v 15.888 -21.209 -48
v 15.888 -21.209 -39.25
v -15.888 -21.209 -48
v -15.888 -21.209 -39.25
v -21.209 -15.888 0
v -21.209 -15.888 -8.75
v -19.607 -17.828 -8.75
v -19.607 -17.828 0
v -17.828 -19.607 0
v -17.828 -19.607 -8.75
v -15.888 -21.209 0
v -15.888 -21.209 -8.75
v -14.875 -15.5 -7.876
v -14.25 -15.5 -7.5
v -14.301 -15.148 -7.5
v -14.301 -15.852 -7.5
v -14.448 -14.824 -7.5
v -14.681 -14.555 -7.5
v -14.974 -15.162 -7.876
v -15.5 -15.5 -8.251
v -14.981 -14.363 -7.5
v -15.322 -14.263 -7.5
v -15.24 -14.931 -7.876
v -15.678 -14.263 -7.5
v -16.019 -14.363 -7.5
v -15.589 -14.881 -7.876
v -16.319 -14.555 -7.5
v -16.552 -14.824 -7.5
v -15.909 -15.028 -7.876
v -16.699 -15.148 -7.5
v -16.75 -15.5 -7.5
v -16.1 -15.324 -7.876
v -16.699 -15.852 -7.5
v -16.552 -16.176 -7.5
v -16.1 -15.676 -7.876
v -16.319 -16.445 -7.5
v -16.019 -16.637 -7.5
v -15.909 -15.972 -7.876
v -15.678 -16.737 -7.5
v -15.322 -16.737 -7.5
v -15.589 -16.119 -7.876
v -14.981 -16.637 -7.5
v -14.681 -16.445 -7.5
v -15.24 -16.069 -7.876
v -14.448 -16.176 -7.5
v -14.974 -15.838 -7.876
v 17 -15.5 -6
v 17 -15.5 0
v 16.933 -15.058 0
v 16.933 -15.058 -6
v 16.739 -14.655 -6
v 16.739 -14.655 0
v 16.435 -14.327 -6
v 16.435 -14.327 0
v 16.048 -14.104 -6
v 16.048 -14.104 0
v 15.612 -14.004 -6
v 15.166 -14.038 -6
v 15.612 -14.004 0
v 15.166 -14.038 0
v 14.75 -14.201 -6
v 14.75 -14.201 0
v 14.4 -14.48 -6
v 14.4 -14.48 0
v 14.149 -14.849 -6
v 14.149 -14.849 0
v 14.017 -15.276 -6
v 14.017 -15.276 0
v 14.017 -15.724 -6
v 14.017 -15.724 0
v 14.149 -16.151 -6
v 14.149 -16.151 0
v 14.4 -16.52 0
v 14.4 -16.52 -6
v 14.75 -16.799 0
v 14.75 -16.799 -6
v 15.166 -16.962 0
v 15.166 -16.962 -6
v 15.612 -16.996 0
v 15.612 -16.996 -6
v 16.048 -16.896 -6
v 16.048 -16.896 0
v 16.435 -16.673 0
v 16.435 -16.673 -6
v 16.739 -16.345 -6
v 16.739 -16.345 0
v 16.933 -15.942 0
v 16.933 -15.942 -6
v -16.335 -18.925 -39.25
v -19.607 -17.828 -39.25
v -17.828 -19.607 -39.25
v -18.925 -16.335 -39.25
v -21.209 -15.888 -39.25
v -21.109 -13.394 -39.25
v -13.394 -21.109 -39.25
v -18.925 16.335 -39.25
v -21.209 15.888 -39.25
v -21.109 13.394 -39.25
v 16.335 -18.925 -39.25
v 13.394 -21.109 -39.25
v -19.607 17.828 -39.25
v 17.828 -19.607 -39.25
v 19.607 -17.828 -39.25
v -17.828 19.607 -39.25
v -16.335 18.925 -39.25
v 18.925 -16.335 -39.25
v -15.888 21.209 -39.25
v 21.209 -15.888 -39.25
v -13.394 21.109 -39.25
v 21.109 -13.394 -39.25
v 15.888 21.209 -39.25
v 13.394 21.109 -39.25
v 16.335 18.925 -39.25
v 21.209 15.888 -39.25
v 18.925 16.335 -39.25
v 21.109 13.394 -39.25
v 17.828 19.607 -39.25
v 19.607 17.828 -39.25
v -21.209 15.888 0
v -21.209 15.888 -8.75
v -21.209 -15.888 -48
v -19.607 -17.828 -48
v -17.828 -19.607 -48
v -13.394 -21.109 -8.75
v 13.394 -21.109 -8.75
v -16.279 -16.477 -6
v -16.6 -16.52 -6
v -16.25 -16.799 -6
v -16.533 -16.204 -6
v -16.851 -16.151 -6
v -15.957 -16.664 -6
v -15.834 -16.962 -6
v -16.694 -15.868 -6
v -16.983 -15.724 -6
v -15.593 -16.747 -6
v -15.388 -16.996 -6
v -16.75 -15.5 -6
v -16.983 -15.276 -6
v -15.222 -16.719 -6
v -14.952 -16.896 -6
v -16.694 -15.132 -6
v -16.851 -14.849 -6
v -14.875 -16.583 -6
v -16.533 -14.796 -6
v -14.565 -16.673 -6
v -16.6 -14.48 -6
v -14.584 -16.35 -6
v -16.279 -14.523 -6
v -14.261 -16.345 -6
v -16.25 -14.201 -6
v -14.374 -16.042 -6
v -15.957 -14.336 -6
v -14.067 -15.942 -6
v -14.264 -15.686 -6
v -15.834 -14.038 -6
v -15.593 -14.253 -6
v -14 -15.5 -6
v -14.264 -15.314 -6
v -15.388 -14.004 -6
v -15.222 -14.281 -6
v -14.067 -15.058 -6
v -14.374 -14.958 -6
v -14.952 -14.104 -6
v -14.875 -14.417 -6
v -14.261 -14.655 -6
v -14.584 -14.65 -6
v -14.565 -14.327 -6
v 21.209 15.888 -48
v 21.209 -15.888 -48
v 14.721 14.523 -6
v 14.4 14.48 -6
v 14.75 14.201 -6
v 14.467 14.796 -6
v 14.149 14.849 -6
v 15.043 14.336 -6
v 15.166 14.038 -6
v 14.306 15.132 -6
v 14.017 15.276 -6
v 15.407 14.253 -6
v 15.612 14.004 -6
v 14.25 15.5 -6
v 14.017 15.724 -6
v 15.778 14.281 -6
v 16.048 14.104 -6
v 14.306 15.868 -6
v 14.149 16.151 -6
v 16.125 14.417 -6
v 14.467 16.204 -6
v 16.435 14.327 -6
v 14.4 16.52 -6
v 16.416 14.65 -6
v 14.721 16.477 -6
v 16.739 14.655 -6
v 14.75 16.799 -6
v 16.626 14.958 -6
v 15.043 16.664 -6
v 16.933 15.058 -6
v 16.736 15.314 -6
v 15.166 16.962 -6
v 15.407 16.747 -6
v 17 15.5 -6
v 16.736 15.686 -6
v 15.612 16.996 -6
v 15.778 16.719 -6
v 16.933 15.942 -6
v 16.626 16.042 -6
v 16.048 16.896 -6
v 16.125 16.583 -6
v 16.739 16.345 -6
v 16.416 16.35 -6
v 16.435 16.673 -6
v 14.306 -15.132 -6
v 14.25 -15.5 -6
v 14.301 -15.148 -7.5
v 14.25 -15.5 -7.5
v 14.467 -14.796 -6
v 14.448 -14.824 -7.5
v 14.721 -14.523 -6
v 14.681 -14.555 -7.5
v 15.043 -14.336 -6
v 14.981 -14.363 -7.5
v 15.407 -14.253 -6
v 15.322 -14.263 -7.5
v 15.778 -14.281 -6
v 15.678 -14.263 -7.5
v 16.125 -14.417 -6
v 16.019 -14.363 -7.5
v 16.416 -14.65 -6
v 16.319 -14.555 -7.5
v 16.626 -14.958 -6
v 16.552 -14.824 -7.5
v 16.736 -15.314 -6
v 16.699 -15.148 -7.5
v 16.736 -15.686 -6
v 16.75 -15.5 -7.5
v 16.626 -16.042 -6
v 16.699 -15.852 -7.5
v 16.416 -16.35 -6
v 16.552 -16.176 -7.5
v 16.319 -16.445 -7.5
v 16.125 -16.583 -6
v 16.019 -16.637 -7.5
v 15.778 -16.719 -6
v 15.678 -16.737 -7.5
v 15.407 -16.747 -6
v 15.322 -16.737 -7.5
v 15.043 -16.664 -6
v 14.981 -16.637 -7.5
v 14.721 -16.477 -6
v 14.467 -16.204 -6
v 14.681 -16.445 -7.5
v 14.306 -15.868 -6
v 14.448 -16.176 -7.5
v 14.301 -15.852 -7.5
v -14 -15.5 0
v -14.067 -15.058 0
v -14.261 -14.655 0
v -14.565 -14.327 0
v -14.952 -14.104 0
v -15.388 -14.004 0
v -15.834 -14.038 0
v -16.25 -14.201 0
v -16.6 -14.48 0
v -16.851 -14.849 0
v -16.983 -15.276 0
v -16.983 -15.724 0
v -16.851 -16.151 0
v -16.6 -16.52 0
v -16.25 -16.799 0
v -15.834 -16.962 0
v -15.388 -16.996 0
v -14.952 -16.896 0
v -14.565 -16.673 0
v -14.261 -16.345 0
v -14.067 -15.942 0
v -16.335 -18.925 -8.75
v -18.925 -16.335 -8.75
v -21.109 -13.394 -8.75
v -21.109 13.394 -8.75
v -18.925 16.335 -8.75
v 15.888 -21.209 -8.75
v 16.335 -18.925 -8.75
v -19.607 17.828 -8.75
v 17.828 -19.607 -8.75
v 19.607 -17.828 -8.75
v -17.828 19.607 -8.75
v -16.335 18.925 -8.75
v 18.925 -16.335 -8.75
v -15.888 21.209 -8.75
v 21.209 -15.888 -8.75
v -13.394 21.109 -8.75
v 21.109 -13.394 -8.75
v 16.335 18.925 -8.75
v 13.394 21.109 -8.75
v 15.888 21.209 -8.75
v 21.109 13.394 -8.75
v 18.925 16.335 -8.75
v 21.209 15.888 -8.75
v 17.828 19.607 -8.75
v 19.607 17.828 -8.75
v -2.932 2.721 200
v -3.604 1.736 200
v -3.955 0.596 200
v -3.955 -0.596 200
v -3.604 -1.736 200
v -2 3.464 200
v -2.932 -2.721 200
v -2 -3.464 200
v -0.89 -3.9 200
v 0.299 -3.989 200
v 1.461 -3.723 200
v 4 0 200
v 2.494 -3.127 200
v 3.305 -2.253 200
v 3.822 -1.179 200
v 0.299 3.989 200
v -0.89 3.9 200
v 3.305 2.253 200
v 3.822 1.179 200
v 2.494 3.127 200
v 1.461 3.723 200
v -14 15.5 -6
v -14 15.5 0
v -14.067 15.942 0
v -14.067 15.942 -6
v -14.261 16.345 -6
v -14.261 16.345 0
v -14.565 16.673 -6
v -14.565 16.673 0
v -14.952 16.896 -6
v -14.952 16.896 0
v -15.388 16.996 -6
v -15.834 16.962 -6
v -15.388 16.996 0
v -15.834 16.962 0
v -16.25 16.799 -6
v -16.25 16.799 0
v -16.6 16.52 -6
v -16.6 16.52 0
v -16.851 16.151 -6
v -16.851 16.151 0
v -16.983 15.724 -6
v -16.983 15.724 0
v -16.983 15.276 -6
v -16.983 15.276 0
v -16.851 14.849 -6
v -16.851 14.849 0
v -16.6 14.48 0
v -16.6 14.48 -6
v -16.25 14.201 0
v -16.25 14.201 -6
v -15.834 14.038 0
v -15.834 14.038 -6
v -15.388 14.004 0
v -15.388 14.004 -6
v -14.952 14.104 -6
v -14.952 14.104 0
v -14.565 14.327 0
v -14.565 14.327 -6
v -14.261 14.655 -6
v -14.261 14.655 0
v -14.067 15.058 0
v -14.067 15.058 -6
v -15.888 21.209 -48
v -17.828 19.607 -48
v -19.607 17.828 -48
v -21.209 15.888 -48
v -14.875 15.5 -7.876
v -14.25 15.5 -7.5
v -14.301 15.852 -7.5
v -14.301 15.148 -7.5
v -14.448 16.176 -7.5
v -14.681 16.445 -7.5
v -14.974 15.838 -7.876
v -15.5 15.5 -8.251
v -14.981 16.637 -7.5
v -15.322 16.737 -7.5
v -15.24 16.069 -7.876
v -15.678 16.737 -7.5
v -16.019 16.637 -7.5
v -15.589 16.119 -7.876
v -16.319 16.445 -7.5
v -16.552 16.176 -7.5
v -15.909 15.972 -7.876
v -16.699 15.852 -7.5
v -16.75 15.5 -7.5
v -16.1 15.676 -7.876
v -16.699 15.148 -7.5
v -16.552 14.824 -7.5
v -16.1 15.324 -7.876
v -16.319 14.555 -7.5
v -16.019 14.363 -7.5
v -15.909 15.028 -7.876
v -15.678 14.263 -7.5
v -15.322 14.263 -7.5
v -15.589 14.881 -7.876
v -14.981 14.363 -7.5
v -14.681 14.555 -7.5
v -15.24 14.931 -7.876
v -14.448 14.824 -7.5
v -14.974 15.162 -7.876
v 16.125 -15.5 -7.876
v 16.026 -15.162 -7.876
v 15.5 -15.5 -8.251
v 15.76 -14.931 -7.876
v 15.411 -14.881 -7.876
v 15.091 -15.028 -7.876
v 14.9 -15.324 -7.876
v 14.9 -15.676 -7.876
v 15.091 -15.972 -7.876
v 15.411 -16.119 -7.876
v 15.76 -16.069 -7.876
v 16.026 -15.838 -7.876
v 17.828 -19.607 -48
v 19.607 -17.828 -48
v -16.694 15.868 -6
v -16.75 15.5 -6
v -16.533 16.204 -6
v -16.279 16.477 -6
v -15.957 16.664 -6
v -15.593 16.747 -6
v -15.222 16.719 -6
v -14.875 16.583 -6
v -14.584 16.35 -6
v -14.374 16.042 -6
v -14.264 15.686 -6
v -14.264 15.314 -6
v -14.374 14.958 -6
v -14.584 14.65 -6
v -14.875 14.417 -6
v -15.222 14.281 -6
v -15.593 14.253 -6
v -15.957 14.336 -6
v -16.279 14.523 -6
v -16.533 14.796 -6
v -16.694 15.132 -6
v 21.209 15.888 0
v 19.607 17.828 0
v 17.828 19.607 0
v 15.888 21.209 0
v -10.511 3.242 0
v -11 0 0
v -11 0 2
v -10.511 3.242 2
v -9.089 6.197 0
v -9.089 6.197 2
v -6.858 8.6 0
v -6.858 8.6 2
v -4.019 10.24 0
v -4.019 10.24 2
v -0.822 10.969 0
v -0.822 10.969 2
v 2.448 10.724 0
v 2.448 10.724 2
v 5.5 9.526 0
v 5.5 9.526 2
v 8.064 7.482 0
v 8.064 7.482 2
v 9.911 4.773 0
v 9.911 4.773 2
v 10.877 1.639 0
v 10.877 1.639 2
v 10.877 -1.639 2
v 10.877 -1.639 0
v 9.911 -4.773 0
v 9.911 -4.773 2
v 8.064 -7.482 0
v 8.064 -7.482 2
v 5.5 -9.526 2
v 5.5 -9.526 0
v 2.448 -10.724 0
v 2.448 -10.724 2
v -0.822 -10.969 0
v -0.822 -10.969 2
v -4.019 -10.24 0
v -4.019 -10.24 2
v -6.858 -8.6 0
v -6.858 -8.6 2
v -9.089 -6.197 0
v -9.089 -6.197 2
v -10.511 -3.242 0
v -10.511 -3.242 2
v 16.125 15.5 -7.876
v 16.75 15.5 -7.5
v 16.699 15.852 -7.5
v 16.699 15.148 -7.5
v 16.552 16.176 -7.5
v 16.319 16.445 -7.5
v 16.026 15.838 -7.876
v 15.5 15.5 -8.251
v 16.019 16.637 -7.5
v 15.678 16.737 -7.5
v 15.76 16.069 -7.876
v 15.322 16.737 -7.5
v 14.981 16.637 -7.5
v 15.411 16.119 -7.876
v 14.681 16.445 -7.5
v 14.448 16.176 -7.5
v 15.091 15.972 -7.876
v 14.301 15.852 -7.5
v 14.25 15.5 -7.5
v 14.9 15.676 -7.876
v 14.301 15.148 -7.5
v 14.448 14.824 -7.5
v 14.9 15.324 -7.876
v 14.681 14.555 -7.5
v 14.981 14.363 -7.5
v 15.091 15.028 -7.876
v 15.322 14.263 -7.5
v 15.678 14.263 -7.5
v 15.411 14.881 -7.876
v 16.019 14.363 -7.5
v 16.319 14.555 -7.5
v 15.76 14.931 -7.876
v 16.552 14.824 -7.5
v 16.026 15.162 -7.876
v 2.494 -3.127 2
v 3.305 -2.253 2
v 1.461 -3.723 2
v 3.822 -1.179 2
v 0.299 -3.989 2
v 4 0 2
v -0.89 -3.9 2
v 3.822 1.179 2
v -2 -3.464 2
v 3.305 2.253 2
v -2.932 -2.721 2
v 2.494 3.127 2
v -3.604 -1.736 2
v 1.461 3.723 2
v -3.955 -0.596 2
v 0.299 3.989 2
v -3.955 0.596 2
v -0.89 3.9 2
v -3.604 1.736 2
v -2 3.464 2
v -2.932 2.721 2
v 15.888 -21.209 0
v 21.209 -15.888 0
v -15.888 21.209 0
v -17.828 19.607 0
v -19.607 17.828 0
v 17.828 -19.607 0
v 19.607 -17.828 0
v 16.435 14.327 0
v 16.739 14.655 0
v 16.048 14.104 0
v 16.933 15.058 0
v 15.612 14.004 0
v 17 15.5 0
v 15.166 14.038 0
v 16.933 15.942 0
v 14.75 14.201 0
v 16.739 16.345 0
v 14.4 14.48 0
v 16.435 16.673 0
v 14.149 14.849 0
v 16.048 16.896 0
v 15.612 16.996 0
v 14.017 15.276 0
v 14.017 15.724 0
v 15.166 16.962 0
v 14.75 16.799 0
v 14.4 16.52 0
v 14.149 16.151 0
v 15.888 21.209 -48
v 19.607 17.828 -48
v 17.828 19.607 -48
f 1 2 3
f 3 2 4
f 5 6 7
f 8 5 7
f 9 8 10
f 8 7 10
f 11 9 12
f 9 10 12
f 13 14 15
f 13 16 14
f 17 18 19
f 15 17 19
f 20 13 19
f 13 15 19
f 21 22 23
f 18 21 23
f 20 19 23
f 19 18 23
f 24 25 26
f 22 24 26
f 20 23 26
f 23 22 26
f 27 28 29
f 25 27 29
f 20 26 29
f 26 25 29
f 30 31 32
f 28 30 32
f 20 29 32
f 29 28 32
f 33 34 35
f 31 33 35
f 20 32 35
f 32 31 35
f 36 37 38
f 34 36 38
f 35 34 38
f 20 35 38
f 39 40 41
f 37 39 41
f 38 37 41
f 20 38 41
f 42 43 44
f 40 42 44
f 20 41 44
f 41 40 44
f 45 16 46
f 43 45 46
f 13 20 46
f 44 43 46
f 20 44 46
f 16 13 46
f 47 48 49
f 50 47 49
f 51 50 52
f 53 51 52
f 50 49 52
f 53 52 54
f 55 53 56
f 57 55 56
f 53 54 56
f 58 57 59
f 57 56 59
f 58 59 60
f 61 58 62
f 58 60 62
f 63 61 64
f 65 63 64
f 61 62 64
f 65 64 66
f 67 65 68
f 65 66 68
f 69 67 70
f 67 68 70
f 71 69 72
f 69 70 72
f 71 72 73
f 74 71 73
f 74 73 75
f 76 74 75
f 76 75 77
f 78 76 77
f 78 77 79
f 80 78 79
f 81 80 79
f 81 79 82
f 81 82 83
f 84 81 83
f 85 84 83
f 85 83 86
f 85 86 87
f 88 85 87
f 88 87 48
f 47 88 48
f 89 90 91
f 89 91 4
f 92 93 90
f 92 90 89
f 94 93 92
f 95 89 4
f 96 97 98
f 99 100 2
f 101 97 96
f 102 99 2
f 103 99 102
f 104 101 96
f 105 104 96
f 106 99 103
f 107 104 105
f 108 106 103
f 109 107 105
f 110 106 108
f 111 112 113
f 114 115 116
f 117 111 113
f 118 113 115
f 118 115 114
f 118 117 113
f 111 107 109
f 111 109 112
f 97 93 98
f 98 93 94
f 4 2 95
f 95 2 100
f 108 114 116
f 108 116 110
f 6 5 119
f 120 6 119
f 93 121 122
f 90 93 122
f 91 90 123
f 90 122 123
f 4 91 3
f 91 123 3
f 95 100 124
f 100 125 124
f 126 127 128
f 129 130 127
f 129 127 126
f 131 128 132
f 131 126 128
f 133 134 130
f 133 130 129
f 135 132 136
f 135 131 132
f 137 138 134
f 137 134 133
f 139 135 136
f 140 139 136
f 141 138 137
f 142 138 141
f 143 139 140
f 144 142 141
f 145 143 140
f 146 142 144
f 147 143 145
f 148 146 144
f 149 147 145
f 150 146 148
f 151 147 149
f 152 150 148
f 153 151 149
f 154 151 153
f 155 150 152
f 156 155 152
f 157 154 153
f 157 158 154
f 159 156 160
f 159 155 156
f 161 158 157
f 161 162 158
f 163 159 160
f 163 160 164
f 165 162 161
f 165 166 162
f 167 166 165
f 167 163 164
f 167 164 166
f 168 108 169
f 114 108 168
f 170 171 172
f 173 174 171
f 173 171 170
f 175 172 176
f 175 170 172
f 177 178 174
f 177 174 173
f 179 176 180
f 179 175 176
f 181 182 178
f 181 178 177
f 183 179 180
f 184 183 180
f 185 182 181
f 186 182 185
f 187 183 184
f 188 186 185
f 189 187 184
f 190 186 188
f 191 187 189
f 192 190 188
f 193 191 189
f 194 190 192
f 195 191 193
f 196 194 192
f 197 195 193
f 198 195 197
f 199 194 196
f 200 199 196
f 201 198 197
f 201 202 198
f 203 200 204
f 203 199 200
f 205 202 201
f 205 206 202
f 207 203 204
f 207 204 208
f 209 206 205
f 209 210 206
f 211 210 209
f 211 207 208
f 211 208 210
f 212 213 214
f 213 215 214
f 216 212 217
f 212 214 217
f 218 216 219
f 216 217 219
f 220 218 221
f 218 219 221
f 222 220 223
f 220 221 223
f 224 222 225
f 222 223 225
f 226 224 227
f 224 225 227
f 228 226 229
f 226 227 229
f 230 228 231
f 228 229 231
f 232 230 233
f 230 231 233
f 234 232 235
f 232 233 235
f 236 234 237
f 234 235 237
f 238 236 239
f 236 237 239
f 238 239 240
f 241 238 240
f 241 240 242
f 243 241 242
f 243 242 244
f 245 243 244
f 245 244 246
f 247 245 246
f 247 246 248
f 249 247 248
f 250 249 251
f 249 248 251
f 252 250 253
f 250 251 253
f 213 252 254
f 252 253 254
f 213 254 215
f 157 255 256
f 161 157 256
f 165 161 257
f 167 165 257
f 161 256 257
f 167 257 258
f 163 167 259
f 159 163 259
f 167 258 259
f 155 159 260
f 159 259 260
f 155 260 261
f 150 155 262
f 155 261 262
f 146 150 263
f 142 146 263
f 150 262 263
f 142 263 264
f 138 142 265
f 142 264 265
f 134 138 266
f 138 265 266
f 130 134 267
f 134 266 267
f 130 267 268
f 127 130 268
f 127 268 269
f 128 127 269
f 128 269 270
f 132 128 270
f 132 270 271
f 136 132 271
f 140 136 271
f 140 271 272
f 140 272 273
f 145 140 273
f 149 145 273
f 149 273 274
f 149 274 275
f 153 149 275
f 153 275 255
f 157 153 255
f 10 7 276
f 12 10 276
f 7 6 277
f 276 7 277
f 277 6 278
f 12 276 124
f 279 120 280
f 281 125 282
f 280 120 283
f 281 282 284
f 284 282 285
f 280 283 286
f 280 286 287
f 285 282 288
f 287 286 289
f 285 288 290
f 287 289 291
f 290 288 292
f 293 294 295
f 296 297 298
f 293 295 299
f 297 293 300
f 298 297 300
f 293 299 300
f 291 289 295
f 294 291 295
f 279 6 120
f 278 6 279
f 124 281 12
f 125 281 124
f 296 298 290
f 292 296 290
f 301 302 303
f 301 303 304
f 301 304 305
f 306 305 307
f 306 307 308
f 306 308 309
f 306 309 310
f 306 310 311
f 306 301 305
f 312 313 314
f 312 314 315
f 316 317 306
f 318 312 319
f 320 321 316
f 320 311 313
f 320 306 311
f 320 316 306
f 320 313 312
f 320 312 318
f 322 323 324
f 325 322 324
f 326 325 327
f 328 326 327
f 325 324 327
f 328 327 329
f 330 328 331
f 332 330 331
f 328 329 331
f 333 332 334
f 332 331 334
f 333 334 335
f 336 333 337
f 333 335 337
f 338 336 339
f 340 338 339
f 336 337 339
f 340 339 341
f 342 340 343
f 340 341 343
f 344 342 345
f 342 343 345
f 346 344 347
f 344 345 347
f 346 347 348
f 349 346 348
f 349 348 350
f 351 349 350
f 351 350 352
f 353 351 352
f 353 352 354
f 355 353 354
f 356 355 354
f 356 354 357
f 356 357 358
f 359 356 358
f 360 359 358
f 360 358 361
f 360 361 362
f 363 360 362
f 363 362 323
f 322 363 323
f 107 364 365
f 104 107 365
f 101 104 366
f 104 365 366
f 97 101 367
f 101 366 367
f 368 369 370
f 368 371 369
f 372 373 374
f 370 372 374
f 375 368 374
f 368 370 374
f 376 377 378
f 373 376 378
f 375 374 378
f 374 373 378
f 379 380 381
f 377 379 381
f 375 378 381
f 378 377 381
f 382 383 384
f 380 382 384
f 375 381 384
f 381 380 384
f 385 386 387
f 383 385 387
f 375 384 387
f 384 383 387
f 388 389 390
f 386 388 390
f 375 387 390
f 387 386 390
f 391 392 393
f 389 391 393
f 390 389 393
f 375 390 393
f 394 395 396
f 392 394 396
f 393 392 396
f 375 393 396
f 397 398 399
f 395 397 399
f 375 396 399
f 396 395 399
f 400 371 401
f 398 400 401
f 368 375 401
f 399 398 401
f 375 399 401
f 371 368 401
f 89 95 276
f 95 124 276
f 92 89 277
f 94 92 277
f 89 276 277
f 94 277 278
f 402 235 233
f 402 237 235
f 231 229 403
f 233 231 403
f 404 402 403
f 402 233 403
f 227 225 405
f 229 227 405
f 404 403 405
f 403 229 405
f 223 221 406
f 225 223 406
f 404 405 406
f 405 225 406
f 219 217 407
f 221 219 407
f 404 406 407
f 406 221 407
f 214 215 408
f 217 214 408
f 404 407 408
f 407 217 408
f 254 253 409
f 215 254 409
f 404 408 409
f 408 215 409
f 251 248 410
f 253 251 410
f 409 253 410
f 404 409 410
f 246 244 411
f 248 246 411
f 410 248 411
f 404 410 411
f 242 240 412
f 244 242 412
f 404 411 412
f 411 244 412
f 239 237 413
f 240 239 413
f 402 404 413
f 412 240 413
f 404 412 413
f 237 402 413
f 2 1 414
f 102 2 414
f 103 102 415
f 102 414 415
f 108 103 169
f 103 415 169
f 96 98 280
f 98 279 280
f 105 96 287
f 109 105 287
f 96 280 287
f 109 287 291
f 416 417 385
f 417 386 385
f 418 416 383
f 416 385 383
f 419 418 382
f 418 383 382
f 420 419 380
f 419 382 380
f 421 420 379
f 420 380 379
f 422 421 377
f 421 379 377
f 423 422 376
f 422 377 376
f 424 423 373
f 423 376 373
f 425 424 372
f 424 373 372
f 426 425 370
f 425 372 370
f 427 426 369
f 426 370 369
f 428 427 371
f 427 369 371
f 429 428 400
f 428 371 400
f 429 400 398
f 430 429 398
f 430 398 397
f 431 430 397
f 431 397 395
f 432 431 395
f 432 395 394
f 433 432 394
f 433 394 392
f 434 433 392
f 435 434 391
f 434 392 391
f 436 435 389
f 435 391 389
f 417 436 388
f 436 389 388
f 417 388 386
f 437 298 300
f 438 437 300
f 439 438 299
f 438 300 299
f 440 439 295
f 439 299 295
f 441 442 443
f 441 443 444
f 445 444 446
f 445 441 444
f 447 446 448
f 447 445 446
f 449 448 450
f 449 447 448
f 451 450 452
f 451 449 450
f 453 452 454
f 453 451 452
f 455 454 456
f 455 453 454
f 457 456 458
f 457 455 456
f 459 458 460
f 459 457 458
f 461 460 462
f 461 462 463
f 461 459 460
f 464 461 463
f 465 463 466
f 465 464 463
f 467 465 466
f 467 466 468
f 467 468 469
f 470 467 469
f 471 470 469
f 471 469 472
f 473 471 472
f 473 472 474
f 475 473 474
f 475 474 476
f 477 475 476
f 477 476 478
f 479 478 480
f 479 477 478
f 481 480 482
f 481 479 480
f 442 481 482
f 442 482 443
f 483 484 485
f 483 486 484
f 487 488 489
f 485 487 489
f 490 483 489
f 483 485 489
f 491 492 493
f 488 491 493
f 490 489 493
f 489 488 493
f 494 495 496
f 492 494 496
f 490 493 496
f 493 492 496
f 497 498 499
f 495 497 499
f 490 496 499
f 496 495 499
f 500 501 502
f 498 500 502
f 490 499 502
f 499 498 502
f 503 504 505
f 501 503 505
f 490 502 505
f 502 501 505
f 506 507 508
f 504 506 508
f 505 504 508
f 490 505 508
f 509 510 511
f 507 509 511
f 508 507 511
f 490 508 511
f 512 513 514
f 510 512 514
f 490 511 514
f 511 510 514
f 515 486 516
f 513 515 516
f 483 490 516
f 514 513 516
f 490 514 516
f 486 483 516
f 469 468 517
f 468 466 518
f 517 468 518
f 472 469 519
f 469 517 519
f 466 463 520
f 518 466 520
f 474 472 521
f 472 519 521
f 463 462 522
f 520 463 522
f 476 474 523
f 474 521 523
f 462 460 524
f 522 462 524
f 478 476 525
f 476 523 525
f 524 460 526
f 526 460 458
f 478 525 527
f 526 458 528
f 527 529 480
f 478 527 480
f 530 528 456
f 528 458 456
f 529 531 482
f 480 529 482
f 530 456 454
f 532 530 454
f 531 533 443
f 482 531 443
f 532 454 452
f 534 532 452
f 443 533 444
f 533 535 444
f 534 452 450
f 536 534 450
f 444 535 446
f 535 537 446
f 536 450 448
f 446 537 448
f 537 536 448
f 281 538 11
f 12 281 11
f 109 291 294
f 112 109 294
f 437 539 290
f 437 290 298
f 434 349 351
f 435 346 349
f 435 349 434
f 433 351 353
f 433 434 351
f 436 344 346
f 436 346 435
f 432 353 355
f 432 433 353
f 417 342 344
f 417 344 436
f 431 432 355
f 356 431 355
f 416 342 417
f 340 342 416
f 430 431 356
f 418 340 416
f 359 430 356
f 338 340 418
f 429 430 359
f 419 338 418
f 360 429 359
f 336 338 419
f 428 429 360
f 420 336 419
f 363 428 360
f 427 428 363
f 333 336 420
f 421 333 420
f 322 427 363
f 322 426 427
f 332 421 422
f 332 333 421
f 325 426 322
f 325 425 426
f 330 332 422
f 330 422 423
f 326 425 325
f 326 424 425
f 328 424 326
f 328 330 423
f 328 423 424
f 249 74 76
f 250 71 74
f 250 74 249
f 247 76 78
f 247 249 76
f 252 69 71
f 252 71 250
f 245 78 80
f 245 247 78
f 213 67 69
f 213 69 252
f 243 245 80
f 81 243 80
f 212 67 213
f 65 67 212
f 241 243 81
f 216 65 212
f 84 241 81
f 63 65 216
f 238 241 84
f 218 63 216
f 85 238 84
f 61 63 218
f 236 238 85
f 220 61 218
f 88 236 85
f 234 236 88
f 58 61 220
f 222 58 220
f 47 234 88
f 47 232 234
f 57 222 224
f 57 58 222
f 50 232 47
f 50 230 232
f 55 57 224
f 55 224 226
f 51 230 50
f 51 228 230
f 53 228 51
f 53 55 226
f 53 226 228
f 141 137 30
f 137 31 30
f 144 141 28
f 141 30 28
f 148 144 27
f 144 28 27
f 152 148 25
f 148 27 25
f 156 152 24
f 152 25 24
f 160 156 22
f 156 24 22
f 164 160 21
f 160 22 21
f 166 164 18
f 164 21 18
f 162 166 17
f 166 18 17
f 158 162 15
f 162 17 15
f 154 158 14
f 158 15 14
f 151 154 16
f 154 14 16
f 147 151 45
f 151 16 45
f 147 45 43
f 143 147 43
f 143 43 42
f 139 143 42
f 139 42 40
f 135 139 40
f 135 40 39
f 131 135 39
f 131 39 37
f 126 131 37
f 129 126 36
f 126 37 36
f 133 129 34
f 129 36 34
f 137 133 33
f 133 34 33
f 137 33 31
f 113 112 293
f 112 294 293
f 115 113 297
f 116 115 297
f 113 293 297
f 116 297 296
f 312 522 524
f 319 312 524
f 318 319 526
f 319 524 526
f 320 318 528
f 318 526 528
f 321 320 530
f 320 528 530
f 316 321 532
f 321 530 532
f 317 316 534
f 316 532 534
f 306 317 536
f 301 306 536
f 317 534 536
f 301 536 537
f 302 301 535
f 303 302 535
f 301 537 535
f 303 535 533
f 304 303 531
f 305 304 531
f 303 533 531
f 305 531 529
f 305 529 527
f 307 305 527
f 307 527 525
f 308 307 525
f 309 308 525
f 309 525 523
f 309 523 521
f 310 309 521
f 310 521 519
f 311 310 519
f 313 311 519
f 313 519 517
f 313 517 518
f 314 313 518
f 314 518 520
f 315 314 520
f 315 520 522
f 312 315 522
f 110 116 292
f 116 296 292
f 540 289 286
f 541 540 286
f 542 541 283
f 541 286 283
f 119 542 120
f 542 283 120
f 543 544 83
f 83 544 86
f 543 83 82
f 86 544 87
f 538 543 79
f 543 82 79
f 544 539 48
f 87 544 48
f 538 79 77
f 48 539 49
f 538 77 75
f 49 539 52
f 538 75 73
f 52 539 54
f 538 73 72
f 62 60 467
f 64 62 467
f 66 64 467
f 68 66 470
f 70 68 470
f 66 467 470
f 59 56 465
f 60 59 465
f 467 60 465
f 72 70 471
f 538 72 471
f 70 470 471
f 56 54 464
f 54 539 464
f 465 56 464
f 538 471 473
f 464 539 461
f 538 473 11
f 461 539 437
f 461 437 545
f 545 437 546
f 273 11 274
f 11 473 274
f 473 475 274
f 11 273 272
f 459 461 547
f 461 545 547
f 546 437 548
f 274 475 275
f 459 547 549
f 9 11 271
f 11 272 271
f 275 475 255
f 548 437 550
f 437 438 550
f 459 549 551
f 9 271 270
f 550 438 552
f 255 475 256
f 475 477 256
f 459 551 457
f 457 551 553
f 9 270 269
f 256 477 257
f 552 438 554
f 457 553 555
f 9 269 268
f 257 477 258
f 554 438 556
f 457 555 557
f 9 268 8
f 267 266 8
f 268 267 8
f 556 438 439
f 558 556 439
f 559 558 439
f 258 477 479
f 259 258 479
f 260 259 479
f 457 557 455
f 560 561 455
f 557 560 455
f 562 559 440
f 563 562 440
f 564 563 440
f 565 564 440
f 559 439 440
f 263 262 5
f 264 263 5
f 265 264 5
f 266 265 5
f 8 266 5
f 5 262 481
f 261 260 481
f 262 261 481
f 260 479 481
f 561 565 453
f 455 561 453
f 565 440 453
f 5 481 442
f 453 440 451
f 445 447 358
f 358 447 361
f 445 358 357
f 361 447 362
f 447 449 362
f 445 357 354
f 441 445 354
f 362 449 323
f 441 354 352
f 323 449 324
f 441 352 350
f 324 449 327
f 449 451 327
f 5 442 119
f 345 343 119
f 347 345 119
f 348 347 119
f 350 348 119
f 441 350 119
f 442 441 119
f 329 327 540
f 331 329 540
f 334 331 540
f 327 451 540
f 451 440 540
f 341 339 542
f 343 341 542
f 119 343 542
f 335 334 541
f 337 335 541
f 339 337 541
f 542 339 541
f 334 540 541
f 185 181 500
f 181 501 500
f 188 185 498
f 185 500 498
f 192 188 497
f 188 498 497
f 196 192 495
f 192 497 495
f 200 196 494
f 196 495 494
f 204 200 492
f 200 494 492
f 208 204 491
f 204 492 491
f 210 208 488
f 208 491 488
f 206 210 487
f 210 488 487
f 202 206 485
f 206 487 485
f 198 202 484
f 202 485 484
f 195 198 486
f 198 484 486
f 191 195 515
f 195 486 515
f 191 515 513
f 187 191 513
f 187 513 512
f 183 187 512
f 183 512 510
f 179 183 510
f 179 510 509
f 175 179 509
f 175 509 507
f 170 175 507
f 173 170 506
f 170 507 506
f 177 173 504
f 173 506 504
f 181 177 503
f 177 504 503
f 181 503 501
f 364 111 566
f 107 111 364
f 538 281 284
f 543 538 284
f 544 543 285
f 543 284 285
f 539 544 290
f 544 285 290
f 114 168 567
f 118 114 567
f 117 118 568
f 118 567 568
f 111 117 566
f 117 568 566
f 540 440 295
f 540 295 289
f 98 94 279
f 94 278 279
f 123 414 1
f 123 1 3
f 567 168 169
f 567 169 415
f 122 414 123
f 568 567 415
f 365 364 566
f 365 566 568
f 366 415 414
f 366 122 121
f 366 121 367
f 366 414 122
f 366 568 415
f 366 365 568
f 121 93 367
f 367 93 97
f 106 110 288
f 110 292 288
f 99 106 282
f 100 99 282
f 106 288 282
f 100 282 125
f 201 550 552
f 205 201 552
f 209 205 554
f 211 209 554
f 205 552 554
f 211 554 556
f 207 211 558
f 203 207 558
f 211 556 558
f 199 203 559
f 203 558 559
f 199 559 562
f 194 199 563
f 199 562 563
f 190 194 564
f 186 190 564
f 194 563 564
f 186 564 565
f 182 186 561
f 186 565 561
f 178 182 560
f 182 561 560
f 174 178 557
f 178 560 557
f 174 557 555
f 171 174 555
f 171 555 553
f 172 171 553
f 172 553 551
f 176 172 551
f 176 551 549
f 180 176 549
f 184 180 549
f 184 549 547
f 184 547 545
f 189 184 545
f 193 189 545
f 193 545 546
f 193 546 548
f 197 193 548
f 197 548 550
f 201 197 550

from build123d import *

# Parameters (mm, degrees)
SKETCH1_R                       = 4
BOSS_EXTRUDE1_DEPTH             = 200
SKETCH2_R                       = 11
BOSS_EXTRUDE2_DEPTH             = 2
SKETCH3_W                       = 42.418
SKETCH3_H                       = 42.418
BOSS_EXTRUDE3_DEPTH             = 48
CUT_EXTRUDE1_DEPTH              = 250.80721239
M3X0_5_TAPPED_HOLE1_D           = 2.5
M3X0_5_TAPPED_HOLE1_DEPTH       = 7.5
M3X0_5_TAPPED_HOLE1_CBORE_D     = 3
M3X0_5_TAPPED_HOLE1_CBORE_DEPTH = 6
M3X0_5_TAPPED_HOLE1_TIP         = 0.751075774
CUT_EXTRUDE3_DEPTH              = 15.25


with BuildPart() as part:
    # Sketch1 → Boss-Extrude1 (new body)
    with BuildSketch(Plane.XY):
        Circle(SKETCH1_R)
    extrude(amount=BOSS_EXTRUDE1_DEPTH)

    # Sketch2 → Boss-Extrude2 (add)
    with BuildSketch(Plane(origin=(0, 0, 0), x_dir=(-1, 0, 0), z_dir=(0, 0, -1))):
        Circle(SKETCH2_R)
    extrude(amount=-BOSS_EXTRUDE2_DEPTH)

    # Sketch3 → Boss-Extrude3 (add)
    with BuildSketch(Plane(origin=(0, 0, 0), x_dir=(-1, 0, 0), z_dir=(0, 0, -1))):
        Rectangle(SKETCH3_W, SKETCH3_H)
    extrude(amount=BOSS_EXTRUDE3_DEPTH)

    # Sketch4 → Cut-Extrude1 (cut, through all)
    with BuildSketch(Plane(origin=(0, 0, -48), x_dir=(-1, 0, 0), z_dir=(0, 0, -1))):
        with BuildLine():
            Line((-21.209, -15.887992919), (-21.209, -21.209))
            Line((-21.209, -21.209), (-15.887992919, -21.209))
            ThreePointArc((-15.887992919, -21.209), (-18.738329701, -18.738329701), (-21.209, -15.887992919))
        make_face()
        with BuildLine():
            Line((15.887992919, -21.209), (21.209, -21.209))
            Line((21.209, -21.209), (21.209, -15.887992919))
            ThreePointArc((21.209, -15.887992919), (18.738329701, -18.738329701), (15.887992919, -21.209))
        make_face()
        with BuildLine():
            Line((21.209, 15.887992919), (21.209, 21.209))
            Line((21.209, 21.209), (15.887992919, 21.209))
            ThreePointArc((15.887992919, 21.209), (18.738329701, 18.738329701), (21.209, 15.887992919))
        make_face()
        with BuildLine():
            Line((-15.887992919, 21.209), (-21.209, 21.209))
            Line((-21.209, 21.209), (-21.209, 15.887992919))
            ThreePointArc((-21.209, 15.887992919), (-18.738329701, 18.738329701), (-15.887992919, 21.209))
        make_face()
    extrude(amount=-CUT_EXTRUDE1_DEPTH, mode=Mode.SUBTRACT)

    # M3x0.5 Tapped Hole1
    with Locations(Plane.XY):
        with Locations((-15.5, 15.5), (-15.5, -15.5), (15.5, -15.5), (15.5, 15.5)):
            CounterBoreHole(M3X0_5_TAPPED_HOLE1_D / 2, M3X0_5_TAPPED_HOLE1_CBORE_D / 2, M3X0_5_TAPPED_HOLE1_CBORE_DEPTH, depth=M3X0_5_TAPPED_HOLE1_DEPTH)
            with Locations((0, 0, -(M3X0_5_TAPPED_HOLE1_DEPTH + M3X0_5_TAPPED_HOLE1_TIP / 2))):  # 118° drill point
                Cone(0, M3X0_5_TAPPED_HOLE1_D / 2, M3X0_5_TAPPED_HOLE1_TIP, mode=Mode.SUBTRACT)

    # Sketch8 → Cut-Extrude3 (cut, symmetric)
    with BuildSketch(Plane.XY.offset(-24)):
        with BuildLine():
            Line((15.887992919, 21.209), (-15.887992919, 21.209))
            ThreePointArc((-15.887992919, 21.209), (-18.738329701, 18.738329701), (-21.209, 15.887992919))
            Line((-21.209, 15.887992919), (-21.209, -15.887992919))
            ThreePointArc((-21.209, -15.887992919), (-18.738329701, -18.738329701), (-15.887992919, -21.209))
            Line((-15.887992919, -21.209), (15.887992919, -21.209))
            ThreePointArc((15.887992919, -21.209), (18.738329701, -18.738329701), (21.209, -15.887992919))
            Line((21.209, -15.887992919), (21.209, 15.887992919))
            ThreePointArc((21.209, 15.887992919), (18.738329701, 18.738329701), (15.887992919, 21.209))
        make_face()
        with BuildLine():
            Line((-13.394406258, 21.109), (13.394406258, 21.109))
            ThreePointArc((13.394406258, 21.109), (17.67766953, 17.67766953), (21.109, 13.394406258))
            Line((21.109, 13.394406258), (21.109, -13.394406258))
            ThreePointArc((21.109, -13.394406258), (17.67766953, -17.67766953), (13.394406258, -21.109))
            Line((13.394406258, -21.109), (-13.394406258, -21.109))
            ThreePointArc((-13.394406258, -21.109), (-17.67766953, -17.67766953), (-21.109, -13.394406258))
            Line((-21.109, -13.394406258), (-21.109, 13.394406258))
            ThreePointArc((-21.109, 13.394406258), (-17.67766953, 17.67766953), (-13.394406258, 21.109))
        make_face(mode=Mode.SUBTRACT)
    extrude(amount=CUT_EXTRUDE3_DEPTH, both=True, mode=Mode.SUBTRACT)


solid = part.part
